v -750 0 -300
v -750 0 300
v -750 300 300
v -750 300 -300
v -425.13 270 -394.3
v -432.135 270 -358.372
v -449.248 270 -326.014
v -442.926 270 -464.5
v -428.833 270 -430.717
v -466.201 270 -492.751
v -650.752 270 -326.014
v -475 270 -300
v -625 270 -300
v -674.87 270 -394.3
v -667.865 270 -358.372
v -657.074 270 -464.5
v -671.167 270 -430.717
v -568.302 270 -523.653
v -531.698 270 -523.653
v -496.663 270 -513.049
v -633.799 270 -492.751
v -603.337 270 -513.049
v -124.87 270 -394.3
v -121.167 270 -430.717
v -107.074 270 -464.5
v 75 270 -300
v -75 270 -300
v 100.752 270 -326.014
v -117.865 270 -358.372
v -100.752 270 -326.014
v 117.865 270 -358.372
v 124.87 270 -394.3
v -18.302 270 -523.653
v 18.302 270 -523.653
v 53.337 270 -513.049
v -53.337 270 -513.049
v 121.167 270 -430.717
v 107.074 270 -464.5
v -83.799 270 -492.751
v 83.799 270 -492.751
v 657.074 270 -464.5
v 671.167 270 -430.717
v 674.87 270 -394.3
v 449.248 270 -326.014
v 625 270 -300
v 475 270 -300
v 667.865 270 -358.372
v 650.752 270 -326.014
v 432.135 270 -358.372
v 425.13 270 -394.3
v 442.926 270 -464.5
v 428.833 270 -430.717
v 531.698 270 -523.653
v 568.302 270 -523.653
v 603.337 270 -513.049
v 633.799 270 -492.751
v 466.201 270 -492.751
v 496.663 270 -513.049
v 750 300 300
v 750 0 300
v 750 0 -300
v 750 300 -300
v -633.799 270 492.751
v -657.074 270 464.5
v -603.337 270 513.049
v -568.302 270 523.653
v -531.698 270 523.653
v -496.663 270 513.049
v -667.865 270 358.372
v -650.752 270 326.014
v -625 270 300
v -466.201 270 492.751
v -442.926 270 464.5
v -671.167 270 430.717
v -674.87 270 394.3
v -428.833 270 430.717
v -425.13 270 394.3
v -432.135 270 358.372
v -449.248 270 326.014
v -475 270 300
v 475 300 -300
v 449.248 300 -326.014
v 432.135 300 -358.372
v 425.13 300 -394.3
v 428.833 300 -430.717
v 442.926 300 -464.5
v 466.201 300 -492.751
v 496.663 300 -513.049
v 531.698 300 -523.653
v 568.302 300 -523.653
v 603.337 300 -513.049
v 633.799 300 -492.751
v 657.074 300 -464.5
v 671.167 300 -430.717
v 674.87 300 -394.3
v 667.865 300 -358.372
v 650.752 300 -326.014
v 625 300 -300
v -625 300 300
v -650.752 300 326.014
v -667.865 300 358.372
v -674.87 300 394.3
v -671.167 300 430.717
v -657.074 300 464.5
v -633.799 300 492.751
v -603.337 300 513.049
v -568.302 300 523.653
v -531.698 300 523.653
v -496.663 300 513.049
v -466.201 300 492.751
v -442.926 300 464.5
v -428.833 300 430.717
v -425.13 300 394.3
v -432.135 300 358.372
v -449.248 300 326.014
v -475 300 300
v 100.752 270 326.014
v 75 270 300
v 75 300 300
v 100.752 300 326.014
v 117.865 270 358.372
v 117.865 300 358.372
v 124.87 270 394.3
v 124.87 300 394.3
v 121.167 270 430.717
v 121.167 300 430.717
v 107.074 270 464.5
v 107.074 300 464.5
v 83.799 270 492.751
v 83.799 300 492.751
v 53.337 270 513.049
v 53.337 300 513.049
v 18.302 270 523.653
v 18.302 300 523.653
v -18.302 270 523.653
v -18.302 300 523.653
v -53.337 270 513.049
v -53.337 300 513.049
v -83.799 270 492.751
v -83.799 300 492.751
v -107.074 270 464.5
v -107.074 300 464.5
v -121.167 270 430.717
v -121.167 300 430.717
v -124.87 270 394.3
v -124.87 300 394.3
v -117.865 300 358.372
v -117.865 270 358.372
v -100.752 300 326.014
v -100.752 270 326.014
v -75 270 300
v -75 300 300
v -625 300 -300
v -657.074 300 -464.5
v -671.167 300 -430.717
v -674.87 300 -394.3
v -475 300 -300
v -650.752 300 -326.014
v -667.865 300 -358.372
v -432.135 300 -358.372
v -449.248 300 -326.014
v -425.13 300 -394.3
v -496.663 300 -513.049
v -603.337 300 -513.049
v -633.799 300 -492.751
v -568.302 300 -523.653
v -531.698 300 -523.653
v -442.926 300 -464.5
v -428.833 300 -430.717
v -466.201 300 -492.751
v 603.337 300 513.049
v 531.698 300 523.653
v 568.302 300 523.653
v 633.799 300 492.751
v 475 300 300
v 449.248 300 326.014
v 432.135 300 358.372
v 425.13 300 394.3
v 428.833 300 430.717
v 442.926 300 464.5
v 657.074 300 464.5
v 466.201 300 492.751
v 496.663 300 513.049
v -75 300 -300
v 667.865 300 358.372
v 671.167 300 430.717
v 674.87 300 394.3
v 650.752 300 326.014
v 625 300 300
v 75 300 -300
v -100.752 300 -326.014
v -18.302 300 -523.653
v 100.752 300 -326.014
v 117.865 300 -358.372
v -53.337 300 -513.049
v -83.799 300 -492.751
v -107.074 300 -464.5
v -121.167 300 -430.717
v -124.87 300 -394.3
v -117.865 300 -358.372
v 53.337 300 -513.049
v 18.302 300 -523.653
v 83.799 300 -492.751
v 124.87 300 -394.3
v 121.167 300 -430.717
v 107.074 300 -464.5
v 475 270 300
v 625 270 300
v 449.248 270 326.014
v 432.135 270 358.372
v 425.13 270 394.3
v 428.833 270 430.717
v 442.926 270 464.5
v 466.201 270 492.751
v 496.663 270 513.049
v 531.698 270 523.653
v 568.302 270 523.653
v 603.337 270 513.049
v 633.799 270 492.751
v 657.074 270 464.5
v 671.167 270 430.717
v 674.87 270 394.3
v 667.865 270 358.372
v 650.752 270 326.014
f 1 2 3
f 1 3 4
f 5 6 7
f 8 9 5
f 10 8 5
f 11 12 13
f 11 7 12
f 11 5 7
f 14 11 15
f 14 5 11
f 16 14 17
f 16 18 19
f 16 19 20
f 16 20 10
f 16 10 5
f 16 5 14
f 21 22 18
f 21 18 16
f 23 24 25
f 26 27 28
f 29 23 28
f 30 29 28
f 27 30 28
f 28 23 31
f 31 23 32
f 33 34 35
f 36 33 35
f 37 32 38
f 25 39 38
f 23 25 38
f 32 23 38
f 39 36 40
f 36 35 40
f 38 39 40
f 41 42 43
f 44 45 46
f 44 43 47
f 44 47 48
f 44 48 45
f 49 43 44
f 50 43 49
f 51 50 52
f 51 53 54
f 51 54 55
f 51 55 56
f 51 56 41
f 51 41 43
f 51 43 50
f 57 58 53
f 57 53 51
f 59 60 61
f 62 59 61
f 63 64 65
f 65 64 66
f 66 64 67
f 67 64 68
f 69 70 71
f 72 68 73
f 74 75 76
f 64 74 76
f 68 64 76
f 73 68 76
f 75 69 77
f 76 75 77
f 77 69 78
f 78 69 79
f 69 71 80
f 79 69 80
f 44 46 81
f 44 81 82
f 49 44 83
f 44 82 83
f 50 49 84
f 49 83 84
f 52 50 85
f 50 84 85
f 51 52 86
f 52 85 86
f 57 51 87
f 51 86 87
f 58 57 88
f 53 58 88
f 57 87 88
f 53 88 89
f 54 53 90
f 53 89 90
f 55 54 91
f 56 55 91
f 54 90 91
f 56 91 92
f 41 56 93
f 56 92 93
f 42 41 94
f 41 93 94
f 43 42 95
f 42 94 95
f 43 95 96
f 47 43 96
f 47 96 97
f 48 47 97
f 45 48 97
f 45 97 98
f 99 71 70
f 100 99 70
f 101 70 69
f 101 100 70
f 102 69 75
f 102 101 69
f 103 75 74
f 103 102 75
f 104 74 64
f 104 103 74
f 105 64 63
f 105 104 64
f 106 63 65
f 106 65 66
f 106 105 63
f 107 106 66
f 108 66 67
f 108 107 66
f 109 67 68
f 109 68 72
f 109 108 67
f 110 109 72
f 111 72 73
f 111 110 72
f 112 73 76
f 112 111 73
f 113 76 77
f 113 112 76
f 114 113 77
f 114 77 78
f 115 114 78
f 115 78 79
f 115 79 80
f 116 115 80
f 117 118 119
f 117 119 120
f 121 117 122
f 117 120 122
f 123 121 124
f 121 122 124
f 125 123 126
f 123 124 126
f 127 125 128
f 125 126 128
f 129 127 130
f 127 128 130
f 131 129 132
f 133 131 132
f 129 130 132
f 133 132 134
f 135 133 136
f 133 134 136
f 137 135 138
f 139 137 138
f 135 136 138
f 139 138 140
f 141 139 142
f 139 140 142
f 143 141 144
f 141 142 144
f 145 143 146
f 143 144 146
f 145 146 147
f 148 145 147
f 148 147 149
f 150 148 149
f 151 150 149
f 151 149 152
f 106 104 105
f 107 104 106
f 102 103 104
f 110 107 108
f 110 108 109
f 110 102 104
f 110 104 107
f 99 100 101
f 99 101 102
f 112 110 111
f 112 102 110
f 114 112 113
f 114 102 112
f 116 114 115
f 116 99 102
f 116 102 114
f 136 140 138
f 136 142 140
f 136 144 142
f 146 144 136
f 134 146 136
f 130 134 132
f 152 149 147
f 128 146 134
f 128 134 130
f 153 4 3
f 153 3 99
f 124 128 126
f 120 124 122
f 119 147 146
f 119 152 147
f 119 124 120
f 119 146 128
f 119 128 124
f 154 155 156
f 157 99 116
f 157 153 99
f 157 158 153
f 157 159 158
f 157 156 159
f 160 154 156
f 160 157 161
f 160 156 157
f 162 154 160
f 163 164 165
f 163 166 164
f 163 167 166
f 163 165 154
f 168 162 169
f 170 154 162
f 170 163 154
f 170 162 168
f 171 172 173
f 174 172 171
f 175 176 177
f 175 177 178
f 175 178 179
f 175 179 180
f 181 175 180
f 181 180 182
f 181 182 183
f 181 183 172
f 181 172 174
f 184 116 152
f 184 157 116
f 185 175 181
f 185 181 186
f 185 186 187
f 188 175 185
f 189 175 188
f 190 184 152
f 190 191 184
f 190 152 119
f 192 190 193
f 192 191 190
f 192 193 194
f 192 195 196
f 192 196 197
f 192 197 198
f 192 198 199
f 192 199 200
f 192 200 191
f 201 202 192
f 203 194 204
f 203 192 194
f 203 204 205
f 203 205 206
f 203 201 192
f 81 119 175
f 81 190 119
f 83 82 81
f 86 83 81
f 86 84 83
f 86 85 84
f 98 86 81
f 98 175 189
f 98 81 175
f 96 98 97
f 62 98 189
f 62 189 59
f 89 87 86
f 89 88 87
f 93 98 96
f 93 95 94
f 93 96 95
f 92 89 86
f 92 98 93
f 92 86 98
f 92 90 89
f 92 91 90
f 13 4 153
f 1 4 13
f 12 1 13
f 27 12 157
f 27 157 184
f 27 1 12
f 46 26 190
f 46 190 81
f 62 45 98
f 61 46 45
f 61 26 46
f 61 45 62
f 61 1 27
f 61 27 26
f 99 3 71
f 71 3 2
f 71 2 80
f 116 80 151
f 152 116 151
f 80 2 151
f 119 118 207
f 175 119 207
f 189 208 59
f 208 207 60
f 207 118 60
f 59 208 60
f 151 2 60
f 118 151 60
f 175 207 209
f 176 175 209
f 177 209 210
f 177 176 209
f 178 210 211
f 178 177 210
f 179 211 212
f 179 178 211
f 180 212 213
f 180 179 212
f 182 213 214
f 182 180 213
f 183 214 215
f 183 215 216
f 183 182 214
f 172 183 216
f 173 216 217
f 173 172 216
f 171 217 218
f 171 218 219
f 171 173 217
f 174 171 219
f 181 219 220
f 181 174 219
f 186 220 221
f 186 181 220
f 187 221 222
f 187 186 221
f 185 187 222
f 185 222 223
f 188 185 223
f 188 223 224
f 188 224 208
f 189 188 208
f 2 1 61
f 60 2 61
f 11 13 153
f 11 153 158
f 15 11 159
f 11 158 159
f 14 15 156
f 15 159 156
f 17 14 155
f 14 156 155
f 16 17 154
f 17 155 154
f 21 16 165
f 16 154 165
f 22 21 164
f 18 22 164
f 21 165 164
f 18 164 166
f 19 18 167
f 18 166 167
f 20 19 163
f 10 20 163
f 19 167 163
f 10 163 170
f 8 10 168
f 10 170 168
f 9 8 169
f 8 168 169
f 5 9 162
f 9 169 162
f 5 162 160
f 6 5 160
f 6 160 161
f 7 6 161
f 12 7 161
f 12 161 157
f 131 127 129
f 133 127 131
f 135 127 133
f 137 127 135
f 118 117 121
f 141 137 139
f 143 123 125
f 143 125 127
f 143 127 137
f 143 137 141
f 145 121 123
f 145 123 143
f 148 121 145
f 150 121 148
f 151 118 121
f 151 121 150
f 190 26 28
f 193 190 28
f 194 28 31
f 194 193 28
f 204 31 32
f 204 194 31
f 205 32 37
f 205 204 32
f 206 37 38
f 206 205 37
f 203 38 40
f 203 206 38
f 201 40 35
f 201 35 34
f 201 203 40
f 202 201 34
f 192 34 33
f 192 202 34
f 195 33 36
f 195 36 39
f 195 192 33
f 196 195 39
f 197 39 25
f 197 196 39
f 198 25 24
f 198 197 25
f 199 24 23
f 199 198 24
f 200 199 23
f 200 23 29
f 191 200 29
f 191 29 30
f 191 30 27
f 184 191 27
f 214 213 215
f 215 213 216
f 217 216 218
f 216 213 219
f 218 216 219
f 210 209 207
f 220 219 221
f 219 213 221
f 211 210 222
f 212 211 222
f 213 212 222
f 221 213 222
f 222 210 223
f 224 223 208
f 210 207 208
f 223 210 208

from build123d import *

# Parameters (mm, degrees)
SKETCH1_W           = 1500
SKETCH1_H           = 600
BOSS_EXTRUDE1_DEPTH = 300
BOSS_EXTRUDE2_DEPTH = 30


with BuildPart() as part:
    # Sketch1 → Boss-Extrude1 (new body)
    with BuildSketch(Plane(origin=(0, 0, 0), x_dir=(1, 0, 0), z_dir=(0, 1, 0))):
        Rectangle(SKETCH1_W, SKETCH1_H)
    extrude(amount=BOSS_EXTRUDE1_DEPTH)

    # Sketch2 → Boss-Extrude2 (add)
    with BuildSketch(Plane(origin=(0, 300, 0), x_dir=(1, 0, 0), z_dir=(0, 1, 0))):
        with BuildLine():
            Line((-75, -300), (75, -300))
            ThreePointArc((75, -300), (0, -525), (-75, -300))
        make_face()
        with BuildLine():
            Line((-75, 300), (75, 300))
            ThreePointArc((75, 300), (0, 525), (-75, 300))
        make_face()
        with BuildLine():
            Line((625, -300), (475, -300))
            ThreePointArc((475, -300), (550, -525), (625, -300))
        make_face()
        with BuildLine():
            Line((625, 300), (475, 300))
            ThreePointArc((475, 300), (550, 525), (625, 300))
        make_face()
        with BuildLine():
            Line((-475, -300), (-625, -300))
            ThreePointArc((-625, -300), (-550, -525), (-475, -300))
        make_face()
        with BuildLine():
            Line((-475, 300), (-625, 300))
            ThreePointArc((-625, 300), (-550, 525), (-475, 300))
        make_face()
    extrude(amount=-BOSS_EXTRUDE2_DEPTH)


solid = part.part
